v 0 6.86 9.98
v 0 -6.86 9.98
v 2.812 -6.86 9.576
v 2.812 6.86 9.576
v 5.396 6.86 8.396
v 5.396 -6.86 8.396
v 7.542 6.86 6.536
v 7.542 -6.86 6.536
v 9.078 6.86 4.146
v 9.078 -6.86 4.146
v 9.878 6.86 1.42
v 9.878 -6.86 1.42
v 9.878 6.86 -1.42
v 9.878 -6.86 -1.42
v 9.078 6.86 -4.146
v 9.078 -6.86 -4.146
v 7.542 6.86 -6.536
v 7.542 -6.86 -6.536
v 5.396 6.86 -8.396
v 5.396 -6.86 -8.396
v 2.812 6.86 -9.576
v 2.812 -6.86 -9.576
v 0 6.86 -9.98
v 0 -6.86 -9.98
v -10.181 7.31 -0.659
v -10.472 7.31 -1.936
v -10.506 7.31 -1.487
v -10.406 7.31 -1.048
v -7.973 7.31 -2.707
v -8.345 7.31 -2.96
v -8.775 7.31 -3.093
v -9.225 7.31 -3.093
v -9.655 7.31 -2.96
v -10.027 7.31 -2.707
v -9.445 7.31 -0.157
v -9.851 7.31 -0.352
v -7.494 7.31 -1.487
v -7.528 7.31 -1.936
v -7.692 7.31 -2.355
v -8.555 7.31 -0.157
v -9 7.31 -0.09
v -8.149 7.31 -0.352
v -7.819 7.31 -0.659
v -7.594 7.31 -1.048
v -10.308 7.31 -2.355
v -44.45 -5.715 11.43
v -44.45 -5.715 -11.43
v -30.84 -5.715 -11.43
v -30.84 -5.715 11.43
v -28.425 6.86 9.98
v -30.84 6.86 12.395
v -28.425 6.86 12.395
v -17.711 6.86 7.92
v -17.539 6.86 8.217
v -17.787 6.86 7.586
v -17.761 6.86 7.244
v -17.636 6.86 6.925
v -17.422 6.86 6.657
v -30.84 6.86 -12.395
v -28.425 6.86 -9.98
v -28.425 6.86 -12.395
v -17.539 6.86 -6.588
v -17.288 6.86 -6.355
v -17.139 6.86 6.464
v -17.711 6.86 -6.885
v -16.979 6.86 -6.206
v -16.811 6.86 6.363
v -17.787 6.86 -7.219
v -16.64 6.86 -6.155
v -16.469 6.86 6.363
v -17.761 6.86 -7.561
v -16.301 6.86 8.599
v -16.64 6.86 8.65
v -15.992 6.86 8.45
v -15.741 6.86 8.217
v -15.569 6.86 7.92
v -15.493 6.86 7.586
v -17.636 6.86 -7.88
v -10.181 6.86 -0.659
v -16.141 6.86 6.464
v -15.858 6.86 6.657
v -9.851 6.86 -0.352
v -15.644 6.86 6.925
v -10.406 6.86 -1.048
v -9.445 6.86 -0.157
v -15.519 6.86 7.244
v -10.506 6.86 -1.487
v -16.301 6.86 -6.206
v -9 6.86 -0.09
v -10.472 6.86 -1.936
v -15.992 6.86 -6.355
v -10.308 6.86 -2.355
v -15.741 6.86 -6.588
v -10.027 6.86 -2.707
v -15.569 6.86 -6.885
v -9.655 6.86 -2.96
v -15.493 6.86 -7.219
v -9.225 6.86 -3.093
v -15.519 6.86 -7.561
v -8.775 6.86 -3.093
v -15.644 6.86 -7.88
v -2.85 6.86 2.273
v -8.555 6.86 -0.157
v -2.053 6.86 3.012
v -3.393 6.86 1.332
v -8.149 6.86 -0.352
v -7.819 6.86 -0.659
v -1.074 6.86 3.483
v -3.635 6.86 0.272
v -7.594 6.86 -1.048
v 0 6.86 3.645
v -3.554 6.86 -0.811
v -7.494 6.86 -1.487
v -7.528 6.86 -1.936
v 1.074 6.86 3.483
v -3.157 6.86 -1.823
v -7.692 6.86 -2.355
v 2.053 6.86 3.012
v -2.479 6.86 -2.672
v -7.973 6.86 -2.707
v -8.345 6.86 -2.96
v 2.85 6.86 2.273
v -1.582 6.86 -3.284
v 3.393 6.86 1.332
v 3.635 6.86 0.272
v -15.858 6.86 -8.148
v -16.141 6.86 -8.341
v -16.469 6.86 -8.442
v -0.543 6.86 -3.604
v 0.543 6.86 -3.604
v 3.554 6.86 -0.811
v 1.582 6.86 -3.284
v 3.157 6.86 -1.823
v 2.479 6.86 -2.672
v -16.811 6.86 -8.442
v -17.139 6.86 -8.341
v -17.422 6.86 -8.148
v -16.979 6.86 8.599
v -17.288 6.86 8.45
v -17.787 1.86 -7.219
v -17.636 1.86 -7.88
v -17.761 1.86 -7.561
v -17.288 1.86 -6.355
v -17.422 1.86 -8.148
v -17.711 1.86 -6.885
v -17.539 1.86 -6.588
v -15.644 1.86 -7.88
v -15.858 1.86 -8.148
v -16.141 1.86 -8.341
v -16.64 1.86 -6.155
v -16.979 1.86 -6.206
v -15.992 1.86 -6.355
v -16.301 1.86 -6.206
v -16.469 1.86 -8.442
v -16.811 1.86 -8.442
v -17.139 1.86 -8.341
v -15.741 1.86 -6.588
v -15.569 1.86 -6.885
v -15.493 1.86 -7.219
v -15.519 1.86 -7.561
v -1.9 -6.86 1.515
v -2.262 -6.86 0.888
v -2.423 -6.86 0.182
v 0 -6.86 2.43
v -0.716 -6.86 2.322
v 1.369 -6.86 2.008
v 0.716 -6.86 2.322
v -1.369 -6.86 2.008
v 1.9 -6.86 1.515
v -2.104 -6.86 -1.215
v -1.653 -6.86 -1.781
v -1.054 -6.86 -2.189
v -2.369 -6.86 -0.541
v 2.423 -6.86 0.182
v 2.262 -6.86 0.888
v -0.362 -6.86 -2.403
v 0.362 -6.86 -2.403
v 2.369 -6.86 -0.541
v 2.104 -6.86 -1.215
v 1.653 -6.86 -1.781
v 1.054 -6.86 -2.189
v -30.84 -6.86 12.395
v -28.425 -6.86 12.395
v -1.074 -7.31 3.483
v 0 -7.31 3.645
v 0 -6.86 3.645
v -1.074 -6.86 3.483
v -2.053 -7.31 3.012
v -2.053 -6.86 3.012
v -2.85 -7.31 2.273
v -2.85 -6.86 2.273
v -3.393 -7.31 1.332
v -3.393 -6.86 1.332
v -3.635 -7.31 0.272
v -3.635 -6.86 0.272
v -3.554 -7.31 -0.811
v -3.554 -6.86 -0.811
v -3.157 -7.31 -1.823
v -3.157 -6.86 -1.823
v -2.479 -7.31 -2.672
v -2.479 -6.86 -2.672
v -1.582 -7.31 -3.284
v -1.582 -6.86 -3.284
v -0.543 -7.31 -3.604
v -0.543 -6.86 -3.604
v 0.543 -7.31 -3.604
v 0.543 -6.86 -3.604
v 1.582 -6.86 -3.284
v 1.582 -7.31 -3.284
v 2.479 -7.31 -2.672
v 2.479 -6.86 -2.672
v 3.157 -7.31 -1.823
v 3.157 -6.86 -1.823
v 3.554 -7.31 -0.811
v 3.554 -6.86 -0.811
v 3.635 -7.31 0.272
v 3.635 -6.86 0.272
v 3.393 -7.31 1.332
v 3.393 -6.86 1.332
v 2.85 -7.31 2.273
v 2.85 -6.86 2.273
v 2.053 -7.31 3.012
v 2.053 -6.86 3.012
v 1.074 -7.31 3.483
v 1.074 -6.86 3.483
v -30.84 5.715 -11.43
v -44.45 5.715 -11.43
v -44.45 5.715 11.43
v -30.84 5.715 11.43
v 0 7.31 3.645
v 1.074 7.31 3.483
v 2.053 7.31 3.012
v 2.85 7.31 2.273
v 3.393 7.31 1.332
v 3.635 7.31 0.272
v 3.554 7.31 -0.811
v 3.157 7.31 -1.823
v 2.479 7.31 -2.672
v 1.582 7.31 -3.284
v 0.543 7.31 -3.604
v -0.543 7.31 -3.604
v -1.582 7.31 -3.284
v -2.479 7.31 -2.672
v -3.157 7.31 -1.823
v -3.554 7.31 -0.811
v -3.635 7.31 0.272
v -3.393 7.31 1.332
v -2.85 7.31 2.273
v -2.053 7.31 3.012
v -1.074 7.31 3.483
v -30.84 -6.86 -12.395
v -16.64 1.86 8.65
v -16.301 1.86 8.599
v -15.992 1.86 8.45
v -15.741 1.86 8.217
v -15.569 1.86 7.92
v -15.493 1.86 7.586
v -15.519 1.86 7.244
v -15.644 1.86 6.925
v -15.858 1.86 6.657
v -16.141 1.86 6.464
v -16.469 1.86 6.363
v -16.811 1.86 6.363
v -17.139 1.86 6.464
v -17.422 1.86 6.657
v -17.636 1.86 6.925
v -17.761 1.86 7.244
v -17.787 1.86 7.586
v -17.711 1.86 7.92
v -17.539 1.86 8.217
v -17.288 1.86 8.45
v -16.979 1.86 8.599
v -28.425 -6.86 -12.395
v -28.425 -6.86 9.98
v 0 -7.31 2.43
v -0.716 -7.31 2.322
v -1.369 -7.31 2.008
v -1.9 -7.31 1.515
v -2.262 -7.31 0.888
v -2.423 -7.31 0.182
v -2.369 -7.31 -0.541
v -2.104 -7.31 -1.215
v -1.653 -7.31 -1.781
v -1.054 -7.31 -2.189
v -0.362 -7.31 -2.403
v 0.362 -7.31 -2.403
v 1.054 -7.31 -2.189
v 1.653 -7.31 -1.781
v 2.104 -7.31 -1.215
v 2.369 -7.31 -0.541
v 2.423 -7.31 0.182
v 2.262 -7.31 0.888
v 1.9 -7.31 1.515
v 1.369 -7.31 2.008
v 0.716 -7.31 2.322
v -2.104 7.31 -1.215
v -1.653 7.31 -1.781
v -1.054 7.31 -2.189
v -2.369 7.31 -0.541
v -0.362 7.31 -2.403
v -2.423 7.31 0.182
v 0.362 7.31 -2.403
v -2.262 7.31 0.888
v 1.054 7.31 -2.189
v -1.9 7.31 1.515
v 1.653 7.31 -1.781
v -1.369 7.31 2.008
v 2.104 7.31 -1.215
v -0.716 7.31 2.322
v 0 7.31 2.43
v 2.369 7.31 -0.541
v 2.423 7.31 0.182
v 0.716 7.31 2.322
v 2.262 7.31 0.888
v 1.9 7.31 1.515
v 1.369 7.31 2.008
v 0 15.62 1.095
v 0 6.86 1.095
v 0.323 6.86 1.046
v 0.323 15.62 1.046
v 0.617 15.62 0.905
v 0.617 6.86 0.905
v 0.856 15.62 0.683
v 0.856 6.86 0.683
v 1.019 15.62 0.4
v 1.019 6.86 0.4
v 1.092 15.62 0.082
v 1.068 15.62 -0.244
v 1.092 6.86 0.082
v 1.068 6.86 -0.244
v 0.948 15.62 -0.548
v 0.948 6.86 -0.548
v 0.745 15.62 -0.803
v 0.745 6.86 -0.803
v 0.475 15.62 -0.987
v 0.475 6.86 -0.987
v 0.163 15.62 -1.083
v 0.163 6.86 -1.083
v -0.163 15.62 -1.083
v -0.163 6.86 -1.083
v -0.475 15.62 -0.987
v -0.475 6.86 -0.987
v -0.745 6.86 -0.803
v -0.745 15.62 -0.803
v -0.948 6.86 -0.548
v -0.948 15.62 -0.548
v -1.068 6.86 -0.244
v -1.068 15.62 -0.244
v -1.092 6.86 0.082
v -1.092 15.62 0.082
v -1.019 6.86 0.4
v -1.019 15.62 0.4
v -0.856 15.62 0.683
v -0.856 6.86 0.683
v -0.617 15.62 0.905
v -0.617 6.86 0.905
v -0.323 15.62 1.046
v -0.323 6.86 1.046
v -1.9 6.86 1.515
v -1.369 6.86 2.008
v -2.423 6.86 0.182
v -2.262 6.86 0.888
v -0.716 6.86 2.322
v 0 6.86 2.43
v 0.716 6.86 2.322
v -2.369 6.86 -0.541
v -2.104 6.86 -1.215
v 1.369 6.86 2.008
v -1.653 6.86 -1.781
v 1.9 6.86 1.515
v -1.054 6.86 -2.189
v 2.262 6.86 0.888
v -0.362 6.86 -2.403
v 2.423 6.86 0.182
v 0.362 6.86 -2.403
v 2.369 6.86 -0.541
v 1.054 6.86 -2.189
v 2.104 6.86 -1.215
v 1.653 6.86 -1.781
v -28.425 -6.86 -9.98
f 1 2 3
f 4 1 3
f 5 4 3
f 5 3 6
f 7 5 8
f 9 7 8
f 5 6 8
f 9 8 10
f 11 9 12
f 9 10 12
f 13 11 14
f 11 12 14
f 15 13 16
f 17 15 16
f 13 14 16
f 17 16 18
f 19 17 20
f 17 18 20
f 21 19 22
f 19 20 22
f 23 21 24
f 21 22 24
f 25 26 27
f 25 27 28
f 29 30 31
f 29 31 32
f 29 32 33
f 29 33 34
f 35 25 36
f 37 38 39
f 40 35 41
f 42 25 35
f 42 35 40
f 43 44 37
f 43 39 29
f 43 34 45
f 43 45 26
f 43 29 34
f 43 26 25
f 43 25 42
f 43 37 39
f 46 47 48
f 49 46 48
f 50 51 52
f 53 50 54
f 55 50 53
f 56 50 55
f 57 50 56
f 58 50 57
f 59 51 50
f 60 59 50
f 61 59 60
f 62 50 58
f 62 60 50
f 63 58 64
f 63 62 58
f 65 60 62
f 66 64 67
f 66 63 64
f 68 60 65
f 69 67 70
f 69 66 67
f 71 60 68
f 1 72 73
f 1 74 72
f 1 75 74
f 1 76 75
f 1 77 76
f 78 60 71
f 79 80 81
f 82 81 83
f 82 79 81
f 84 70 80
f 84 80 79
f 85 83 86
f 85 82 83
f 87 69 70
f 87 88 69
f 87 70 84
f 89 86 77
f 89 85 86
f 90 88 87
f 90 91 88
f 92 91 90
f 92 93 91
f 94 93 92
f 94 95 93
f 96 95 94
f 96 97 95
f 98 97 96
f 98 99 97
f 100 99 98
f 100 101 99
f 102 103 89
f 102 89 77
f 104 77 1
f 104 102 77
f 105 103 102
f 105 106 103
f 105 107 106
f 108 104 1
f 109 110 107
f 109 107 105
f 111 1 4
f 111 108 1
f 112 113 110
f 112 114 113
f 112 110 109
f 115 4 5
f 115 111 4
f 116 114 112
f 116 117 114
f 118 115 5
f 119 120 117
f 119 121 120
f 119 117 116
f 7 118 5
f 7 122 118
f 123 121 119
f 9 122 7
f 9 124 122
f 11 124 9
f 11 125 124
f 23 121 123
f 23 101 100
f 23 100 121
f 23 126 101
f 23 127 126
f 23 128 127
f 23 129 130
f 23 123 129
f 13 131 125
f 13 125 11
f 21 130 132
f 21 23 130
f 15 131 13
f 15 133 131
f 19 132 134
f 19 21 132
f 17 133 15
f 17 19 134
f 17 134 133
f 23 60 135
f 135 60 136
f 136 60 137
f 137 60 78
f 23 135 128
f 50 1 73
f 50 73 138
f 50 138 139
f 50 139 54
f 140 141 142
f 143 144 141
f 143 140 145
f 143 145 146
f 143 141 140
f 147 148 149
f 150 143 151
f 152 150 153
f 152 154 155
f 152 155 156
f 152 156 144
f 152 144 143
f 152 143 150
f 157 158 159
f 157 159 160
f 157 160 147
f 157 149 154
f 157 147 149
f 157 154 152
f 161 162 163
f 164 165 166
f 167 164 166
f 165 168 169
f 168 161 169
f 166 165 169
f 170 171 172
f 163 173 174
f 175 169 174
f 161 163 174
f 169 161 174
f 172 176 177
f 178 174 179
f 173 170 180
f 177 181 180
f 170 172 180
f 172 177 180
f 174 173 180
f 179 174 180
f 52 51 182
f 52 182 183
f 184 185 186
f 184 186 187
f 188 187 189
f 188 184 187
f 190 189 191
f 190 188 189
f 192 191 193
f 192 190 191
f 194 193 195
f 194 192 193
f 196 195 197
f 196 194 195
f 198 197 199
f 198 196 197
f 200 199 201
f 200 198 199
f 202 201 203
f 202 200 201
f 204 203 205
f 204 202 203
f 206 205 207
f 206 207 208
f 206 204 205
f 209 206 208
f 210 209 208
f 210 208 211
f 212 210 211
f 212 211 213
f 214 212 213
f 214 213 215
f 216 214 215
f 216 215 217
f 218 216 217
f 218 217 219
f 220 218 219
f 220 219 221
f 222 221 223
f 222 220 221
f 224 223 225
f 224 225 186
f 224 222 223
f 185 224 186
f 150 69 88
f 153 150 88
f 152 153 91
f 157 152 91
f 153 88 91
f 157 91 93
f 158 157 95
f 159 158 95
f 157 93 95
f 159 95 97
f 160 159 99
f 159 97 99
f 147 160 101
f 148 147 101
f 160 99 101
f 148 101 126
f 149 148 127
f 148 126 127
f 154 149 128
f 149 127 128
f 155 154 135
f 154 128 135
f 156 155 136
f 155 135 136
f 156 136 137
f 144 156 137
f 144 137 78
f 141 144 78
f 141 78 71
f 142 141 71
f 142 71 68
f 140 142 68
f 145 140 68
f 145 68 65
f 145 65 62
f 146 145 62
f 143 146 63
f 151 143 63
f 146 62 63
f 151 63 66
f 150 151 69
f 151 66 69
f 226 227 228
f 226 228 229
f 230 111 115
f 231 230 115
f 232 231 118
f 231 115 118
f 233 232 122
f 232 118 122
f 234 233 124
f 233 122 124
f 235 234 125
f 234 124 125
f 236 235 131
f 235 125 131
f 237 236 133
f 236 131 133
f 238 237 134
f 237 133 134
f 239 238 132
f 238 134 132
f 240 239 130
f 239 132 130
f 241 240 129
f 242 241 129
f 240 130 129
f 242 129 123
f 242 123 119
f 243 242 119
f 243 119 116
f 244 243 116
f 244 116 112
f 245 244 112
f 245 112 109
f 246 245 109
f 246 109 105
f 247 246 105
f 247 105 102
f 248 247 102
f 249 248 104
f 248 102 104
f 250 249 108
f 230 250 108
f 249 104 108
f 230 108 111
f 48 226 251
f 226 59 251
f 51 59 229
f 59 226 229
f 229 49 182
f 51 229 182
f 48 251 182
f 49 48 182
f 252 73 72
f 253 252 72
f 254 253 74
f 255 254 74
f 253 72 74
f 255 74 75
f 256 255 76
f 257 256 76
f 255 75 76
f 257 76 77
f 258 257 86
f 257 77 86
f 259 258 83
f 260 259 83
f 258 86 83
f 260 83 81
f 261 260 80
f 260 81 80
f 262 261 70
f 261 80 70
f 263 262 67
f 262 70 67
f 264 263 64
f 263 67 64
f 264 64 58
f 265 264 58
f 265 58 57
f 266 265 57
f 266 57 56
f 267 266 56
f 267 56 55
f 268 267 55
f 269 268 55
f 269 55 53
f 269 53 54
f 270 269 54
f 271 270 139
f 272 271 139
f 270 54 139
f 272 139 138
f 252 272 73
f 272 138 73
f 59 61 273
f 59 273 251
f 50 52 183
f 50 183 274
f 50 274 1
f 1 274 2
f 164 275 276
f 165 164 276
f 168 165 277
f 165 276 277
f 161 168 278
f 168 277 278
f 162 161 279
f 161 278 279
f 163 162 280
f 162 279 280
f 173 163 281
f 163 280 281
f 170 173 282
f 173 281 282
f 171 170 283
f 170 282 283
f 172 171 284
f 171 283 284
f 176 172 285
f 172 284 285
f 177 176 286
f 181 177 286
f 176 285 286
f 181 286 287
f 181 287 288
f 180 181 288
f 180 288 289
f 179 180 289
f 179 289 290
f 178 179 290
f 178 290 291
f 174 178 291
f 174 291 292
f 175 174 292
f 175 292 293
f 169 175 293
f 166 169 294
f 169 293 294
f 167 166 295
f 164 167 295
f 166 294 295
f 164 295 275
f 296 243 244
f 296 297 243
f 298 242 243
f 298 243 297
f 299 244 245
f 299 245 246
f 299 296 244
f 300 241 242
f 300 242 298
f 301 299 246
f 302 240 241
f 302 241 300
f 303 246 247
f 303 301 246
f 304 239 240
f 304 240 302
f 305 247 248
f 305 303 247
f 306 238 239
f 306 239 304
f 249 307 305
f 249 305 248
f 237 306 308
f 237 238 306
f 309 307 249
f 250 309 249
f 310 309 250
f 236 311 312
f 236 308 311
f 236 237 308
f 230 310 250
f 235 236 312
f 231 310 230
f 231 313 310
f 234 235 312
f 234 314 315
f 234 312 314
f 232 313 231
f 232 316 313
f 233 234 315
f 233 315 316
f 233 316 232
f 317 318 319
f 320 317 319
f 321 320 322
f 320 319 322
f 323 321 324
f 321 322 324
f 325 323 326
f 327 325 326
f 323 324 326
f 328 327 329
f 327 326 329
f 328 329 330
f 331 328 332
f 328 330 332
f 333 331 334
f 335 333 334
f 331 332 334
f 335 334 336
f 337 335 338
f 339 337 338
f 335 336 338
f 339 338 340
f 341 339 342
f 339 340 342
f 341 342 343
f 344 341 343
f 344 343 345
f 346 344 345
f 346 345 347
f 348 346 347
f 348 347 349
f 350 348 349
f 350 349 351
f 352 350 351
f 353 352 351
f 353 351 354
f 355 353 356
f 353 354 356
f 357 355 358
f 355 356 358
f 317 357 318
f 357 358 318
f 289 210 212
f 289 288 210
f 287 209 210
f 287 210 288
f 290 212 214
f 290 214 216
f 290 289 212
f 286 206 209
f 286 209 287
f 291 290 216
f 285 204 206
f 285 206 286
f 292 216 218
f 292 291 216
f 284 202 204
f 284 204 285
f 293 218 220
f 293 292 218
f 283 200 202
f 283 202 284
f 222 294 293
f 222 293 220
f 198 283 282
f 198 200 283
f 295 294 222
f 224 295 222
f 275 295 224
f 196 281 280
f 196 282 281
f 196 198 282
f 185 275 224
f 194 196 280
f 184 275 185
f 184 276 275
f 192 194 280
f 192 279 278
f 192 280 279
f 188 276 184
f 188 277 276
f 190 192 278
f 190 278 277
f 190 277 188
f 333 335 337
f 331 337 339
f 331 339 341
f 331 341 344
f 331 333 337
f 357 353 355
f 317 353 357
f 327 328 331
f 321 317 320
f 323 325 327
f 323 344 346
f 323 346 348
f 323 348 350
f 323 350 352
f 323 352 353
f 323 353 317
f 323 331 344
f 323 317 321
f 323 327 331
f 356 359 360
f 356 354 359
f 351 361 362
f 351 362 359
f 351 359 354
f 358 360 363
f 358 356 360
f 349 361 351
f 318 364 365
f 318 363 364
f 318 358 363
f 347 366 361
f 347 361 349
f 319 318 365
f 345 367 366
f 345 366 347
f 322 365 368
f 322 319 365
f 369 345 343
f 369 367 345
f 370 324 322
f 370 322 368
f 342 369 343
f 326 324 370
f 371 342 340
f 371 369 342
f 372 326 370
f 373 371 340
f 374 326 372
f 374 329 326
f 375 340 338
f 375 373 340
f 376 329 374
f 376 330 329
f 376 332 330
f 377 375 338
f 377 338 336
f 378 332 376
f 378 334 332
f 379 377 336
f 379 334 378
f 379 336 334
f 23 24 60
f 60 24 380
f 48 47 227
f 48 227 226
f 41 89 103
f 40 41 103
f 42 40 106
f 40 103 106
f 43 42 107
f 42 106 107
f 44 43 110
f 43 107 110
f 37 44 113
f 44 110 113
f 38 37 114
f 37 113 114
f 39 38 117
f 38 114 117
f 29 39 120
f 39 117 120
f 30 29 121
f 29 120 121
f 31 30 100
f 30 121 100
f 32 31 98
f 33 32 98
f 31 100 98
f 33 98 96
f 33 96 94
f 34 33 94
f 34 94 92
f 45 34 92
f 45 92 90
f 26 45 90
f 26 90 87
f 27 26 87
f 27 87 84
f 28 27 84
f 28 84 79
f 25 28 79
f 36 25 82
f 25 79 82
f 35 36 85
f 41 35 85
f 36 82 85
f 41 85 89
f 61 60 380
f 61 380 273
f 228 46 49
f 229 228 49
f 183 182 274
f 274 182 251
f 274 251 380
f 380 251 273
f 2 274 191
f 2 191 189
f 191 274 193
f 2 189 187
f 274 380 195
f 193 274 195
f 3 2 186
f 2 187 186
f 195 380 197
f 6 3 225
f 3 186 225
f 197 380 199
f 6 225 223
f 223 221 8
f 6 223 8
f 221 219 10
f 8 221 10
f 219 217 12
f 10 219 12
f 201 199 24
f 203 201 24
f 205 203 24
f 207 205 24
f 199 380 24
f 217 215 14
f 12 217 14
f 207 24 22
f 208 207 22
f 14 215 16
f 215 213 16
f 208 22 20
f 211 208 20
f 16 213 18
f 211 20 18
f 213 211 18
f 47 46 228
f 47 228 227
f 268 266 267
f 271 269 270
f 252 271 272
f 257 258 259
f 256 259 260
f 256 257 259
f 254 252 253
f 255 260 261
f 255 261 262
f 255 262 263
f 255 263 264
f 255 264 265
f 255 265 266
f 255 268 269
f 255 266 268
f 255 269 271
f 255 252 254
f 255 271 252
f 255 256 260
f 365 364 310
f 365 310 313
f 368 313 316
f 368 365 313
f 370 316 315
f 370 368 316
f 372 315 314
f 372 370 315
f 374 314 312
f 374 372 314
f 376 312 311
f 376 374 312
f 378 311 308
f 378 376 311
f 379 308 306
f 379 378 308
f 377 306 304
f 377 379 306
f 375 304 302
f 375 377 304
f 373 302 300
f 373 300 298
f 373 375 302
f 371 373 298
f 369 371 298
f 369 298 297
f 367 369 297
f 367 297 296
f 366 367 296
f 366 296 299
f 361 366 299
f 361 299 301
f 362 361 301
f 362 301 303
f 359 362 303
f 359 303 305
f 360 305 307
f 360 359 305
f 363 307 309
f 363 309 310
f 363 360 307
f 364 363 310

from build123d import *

# Parameters (mm, degrees)
GEAR_BOX_DEPTH      = 6.86
GEAR_BOX_DEPTH_BACK = 6.86
MOTOR_DEPTH         = 5.715
MOTOR_DEPTH_BACK    = 5.715
SKETCH2_W           = 13.61
SKETCH2_H           = 22.86
SKETCH3_R           = 1.51
SKETCH3_R_2         = 3.645
SKETCH3_R_3         = 2.43
SPACER_DEPTH        = 0.45
SPACER_BACK_START   = 0.45
SKETCH5_R           = 3.645
SKETCH5_R_2         = 2.43
SPACER_BACK_DEPTH   = 0.45
SKETCH4_R           = 1.095
OUTPUT_SHAFT_DEPTH  = 8.76
SKETCH7_R           = 1.15
CUT_EXTRUDE1_DEPTH  = 5


with BuildPart() as part:
    # Sketch1 → Gear Box (new, two sides: drawn at the far end of the back side and taken through both)
    with BuildSketch(Plane(origin=(0, 0, 0), x_dir=(1, 0, 0), z_dir=(0, 1, 0)).offset(-GEAR_BOX_DEPTH_BACK)):
        with BuildLine():
            Line((0, 9.98), (-28.425, 9.98))
            Line((-28.425, 9.98), (-28.425, 12.395))
            Line((-28.425, 12.395), (-30.84, 12.395))
            Line((-30.84, 12.395), (-30.84, -12.395))
            Line((-30.84, -12.395), (-28.425, -12.395))
            Line((-28.425, -12.395), (-28.425, -9.98))
            Line((-28.425, -9.98), (0, -9.98))
            ThreePointArc((0, -9.98), (9.98, 0), (0, 9.98))
        make_face()
    extrude(amount=GEAR_BOX_DEPTH + GEAR_BOX_DEPTH_BACK)

    # Sketch2 → Motor (add, two sides: drawn at the far end of the back side and taken through both)
    with BuildSketch(Plane(origin=(0, 0, 0), x_dir=(1, 0, 0), z_dir=(0, 1, 0)).offset(-MOTOR_DEPTH_BACK)):
        with Locations((-37.645, 0)):
            Rectangle(SKETCH2_W, SKETCH2_H)
    extrude(amount=MOTOR_DEPTH + MOTOR_DEPTH_BACK)

    # Sketch3 → Spacer (add)
    # profile 1 of 2: a face of its own
    with BuildSketch(Plane(origin=(0, 6.86, 0), x_dir=(1, 0, 0), z_dir=(0, 1, 0))):
        with Locations(Location((-9, 1.6, 0), (0, 0, 270))):
            Circle(SKETCH3_R)
    # profile 2 of 2: a face of its own
    with BuildSketch(Plane(origin=(0, 6.86, 0), x_dir=(1, 0, 0), z_dir=(0, 1, 0))):
        with Locations(Location((0, 0, 0), (0, 0, 270))):
            Circle(SKETCH3_R_2)
        with Locations(Location((0, 0, 0), (0, 0, 270))):
            Circle(SKETCH3_R_3, mode=Mode.SUBTRACT)
    extrude(amount=SPACER_DEPTH)

    # Sketch5 → Spacer(back) (add)
    with BuildSketch(Plane.XZ.offset(6.86).offset(SPACER_BACK_START)):
        with Locations(Location((0, 0, 0), (0, 0, 90))):
            Circle(SKETCH5_R)
        with Locations(Location((0, 0, 0), (0, 0, 90))):
            Circle(SKETCH5_R_2, mode=Mode.SUBTRACT)
    extrude(amount=-SPACER_BACK_DEPTH)

    # Sketch4 → Output Shaft (add)
    with BuildSketch(Plane(origin=(0, 6.86, 0), x_dir=(1, 0, 0), z_dir=(0, 1, 0))):
        with Locations(Location((0, 0, 0), (0, 0, 270))):
            Circle(SKETCH4_R)
    extrude(amount=OUTPUT_SHAFT_DEPTH)

    # Sketch7 → Cut-Extrude1 (cut)
    with BuildSketch(Plane(origin=(0, 6.86, 0), x_dir=(1, 0, 0), z_dir=(0, 1, 0))):
        with Locations(Location((-16.64, 7.30523239, 0), (0, 0, 270))):
            Circle(SKETCH7_R)
        with Locations(Location((-16.64, -7.5, 0), (0, 0, 270))):
            Circle(SKETCH7_R)
    extrude(amount=-CUT_EXTRUDE1_DEPTH, mode=Mode.SUBTRACT)


solid = part.part
